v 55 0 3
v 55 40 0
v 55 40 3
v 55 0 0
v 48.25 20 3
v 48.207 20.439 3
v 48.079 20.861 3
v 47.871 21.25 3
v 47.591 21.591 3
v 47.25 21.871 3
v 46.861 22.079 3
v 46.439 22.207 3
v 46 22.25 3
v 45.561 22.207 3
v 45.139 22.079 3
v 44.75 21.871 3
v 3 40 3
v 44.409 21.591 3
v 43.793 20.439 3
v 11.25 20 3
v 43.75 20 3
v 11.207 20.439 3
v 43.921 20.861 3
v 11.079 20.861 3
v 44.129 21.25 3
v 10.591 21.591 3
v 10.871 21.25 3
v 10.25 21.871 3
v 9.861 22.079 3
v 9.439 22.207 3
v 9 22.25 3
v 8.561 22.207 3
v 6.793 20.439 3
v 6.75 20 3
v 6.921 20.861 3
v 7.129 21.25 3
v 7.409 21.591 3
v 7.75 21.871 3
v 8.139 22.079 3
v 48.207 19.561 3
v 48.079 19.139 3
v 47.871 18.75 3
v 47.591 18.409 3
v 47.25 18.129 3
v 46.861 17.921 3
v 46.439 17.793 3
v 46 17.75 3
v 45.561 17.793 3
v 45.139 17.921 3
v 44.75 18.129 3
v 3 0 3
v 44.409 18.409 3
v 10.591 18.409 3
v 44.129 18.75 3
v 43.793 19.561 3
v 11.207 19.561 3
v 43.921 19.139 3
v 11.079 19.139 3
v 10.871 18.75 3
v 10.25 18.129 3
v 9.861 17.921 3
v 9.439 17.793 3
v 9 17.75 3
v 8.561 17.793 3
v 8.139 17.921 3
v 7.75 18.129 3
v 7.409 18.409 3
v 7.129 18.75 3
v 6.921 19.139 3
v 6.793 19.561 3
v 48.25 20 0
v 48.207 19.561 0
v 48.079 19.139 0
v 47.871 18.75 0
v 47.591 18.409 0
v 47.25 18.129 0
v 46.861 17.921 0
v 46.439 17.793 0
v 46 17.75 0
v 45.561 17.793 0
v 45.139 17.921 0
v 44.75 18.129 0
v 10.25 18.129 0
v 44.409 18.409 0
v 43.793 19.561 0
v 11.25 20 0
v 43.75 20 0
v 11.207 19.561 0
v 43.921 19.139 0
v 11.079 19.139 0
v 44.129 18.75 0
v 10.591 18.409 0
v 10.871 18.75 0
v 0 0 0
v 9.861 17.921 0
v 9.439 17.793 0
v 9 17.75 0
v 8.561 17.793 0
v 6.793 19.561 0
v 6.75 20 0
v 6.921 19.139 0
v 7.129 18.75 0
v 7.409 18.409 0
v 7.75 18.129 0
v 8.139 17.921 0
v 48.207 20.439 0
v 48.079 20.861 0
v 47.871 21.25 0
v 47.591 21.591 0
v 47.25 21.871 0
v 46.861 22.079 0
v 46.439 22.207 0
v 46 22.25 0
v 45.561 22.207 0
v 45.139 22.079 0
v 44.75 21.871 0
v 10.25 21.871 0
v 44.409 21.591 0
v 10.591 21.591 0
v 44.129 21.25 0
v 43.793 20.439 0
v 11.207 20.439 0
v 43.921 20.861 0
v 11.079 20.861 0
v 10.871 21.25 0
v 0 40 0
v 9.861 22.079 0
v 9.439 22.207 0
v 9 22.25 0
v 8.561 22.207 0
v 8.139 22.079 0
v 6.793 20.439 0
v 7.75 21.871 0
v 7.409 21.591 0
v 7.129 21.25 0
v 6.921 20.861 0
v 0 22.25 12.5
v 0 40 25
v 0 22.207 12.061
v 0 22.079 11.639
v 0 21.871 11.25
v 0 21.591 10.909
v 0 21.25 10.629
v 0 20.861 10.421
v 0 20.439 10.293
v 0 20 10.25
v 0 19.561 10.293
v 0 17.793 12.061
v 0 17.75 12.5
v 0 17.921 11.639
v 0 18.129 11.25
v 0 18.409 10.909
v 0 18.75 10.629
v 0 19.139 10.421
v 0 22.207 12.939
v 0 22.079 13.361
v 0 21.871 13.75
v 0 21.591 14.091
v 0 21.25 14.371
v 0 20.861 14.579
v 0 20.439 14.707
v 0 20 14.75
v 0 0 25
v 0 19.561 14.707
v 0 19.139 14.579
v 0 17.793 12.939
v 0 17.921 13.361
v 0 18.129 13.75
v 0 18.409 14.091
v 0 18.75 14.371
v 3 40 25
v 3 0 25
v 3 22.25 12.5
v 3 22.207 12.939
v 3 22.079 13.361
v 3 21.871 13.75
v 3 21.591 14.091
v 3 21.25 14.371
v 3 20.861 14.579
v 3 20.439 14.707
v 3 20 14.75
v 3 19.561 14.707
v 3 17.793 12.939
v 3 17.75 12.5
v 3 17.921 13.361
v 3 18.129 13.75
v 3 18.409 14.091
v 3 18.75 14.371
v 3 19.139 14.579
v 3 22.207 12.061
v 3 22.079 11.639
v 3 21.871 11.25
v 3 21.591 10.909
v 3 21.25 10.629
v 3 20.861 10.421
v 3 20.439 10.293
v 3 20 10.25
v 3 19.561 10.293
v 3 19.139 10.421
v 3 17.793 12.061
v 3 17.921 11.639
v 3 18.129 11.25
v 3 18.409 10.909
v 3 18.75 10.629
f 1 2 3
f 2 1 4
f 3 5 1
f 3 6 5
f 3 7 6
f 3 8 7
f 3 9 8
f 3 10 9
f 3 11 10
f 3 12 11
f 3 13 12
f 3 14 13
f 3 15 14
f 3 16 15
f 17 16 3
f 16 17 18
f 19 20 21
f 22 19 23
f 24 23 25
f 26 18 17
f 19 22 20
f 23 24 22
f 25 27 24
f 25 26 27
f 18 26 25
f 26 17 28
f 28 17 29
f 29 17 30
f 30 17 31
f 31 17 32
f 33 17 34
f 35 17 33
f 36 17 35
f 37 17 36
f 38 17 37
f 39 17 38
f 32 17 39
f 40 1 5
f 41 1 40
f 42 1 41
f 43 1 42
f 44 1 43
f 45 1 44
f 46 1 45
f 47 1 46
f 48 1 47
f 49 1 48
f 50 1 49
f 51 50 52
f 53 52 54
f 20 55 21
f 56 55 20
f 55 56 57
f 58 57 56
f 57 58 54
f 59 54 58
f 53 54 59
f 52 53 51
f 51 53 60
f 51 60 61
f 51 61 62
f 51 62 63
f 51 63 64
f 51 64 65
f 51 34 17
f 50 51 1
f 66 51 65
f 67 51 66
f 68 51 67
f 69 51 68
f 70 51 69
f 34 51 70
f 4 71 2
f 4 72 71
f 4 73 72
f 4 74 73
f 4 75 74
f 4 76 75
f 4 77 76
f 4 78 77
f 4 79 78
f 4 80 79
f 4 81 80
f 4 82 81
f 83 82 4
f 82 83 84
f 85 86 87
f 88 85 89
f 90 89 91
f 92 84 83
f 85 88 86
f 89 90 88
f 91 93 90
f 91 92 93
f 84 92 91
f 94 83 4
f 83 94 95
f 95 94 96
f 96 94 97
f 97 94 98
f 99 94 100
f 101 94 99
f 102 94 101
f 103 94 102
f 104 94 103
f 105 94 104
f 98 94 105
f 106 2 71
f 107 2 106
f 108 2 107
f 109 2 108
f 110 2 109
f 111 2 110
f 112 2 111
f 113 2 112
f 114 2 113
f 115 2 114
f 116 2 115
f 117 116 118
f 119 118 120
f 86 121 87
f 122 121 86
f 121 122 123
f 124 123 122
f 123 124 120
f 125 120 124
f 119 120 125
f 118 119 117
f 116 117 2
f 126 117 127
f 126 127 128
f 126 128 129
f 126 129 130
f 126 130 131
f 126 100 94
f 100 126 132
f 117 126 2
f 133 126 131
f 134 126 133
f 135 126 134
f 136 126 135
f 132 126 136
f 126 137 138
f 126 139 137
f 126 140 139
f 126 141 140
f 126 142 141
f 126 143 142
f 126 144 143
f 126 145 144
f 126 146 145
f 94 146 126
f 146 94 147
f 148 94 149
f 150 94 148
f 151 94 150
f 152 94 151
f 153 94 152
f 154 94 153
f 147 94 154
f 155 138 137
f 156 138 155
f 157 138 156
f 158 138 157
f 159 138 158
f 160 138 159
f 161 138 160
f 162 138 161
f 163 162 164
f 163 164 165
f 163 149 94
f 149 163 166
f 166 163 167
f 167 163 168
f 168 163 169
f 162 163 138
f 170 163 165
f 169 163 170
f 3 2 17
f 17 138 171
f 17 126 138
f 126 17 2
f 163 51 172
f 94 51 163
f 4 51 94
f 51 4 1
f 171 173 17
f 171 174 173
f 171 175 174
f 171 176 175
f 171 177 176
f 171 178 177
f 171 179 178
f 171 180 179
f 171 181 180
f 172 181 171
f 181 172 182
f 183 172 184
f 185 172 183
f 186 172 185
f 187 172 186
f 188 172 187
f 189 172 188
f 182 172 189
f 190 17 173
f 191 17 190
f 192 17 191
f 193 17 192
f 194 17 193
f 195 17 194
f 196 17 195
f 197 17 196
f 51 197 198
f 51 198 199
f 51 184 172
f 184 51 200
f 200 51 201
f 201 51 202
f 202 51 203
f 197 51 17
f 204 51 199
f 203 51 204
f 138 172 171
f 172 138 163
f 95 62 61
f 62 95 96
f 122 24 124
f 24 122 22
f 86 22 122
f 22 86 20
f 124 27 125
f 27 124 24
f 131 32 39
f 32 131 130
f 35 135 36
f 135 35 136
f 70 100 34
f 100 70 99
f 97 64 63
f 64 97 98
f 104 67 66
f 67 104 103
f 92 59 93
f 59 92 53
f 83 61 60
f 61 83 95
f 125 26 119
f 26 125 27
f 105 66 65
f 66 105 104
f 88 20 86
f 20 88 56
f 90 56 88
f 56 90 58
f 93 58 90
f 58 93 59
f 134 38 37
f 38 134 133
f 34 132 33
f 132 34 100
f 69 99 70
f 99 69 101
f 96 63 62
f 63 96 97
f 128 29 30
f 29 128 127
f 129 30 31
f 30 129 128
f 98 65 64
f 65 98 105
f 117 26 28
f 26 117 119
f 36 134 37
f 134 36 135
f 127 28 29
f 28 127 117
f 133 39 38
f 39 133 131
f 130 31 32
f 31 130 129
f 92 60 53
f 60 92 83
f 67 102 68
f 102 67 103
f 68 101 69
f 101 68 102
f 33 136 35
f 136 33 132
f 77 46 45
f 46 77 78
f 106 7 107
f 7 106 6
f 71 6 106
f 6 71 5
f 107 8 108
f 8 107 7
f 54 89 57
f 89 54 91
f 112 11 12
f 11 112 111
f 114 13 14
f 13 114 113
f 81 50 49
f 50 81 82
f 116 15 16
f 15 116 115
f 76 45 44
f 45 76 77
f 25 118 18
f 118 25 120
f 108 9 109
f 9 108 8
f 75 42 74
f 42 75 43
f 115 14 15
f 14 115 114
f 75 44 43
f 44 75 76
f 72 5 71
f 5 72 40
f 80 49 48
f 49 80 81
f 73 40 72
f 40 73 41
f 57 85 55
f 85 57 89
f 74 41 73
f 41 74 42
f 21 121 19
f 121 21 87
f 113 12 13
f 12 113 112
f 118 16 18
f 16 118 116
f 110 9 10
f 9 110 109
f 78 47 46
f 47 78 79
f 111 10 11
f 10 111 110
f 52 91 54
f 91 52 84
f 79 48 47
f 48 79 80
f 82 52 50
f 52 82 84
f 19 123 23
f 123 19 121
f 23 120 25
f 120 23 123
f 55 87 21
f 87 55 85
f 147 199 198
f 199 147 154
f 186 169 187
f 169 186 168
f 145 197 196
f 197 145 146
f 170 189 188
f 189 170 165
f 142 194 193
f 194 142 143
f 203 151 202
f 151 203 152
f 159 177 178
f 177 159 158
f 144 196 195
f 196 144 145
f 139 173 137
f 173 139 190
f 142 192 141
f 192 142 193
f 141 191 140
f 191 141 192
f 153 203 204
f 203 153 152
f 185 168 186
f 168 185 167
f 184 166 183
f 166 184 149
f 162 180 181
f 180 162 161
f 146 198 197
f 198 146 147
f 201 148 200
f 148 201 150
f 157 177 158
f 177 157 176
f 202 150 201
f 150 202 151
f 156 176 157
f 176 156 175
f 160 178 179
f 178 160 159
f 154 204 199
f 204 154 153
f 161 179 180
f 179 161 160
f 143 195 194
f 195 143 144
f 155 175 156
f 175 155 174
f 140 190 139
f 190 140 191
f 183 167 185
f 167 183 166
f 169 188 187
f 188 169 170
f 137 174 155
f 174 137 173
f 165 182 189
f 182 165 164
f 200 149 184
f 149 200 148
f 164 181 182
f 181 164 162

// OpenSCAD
$fn = 32;

// ----------------------------------------------------------------------
// L-bracket: 55 x 40 x 25 mm
// ----------------------------------------------------------------------

// --- parameters (mm) ---
run_out = 55;             // horizontal leg, X
rise = 25;                // vertical leg, Z
bracket_w = 40;           // bracket depth, Y
sheet_t = 3;              // plate thickness
hole_d = 4.5;             // clearance for M4

module hole_z(px, py) {
  translate([px, py, -0.5]) cylinder(h = sheet_t + 1, d = hole_d);
}
module hole_x(pz, py) {
  translate([-0.5, py, pz]) rotate([0, 90, 0]) cylinder(h = sheet_t + 1, d = hole_d);
}

difference() {
  union() {
    /* horizontal leg */
    cube([run_out, bracket_w, sheet_t]);
    /* vertical leg, overlapping the corner block */
    cube([sheet_t, bracket_w, rise]);
  }
  hole_z(9, 20);
  hole_z(46, 20);
  hole_x(12.5, 20);
}
